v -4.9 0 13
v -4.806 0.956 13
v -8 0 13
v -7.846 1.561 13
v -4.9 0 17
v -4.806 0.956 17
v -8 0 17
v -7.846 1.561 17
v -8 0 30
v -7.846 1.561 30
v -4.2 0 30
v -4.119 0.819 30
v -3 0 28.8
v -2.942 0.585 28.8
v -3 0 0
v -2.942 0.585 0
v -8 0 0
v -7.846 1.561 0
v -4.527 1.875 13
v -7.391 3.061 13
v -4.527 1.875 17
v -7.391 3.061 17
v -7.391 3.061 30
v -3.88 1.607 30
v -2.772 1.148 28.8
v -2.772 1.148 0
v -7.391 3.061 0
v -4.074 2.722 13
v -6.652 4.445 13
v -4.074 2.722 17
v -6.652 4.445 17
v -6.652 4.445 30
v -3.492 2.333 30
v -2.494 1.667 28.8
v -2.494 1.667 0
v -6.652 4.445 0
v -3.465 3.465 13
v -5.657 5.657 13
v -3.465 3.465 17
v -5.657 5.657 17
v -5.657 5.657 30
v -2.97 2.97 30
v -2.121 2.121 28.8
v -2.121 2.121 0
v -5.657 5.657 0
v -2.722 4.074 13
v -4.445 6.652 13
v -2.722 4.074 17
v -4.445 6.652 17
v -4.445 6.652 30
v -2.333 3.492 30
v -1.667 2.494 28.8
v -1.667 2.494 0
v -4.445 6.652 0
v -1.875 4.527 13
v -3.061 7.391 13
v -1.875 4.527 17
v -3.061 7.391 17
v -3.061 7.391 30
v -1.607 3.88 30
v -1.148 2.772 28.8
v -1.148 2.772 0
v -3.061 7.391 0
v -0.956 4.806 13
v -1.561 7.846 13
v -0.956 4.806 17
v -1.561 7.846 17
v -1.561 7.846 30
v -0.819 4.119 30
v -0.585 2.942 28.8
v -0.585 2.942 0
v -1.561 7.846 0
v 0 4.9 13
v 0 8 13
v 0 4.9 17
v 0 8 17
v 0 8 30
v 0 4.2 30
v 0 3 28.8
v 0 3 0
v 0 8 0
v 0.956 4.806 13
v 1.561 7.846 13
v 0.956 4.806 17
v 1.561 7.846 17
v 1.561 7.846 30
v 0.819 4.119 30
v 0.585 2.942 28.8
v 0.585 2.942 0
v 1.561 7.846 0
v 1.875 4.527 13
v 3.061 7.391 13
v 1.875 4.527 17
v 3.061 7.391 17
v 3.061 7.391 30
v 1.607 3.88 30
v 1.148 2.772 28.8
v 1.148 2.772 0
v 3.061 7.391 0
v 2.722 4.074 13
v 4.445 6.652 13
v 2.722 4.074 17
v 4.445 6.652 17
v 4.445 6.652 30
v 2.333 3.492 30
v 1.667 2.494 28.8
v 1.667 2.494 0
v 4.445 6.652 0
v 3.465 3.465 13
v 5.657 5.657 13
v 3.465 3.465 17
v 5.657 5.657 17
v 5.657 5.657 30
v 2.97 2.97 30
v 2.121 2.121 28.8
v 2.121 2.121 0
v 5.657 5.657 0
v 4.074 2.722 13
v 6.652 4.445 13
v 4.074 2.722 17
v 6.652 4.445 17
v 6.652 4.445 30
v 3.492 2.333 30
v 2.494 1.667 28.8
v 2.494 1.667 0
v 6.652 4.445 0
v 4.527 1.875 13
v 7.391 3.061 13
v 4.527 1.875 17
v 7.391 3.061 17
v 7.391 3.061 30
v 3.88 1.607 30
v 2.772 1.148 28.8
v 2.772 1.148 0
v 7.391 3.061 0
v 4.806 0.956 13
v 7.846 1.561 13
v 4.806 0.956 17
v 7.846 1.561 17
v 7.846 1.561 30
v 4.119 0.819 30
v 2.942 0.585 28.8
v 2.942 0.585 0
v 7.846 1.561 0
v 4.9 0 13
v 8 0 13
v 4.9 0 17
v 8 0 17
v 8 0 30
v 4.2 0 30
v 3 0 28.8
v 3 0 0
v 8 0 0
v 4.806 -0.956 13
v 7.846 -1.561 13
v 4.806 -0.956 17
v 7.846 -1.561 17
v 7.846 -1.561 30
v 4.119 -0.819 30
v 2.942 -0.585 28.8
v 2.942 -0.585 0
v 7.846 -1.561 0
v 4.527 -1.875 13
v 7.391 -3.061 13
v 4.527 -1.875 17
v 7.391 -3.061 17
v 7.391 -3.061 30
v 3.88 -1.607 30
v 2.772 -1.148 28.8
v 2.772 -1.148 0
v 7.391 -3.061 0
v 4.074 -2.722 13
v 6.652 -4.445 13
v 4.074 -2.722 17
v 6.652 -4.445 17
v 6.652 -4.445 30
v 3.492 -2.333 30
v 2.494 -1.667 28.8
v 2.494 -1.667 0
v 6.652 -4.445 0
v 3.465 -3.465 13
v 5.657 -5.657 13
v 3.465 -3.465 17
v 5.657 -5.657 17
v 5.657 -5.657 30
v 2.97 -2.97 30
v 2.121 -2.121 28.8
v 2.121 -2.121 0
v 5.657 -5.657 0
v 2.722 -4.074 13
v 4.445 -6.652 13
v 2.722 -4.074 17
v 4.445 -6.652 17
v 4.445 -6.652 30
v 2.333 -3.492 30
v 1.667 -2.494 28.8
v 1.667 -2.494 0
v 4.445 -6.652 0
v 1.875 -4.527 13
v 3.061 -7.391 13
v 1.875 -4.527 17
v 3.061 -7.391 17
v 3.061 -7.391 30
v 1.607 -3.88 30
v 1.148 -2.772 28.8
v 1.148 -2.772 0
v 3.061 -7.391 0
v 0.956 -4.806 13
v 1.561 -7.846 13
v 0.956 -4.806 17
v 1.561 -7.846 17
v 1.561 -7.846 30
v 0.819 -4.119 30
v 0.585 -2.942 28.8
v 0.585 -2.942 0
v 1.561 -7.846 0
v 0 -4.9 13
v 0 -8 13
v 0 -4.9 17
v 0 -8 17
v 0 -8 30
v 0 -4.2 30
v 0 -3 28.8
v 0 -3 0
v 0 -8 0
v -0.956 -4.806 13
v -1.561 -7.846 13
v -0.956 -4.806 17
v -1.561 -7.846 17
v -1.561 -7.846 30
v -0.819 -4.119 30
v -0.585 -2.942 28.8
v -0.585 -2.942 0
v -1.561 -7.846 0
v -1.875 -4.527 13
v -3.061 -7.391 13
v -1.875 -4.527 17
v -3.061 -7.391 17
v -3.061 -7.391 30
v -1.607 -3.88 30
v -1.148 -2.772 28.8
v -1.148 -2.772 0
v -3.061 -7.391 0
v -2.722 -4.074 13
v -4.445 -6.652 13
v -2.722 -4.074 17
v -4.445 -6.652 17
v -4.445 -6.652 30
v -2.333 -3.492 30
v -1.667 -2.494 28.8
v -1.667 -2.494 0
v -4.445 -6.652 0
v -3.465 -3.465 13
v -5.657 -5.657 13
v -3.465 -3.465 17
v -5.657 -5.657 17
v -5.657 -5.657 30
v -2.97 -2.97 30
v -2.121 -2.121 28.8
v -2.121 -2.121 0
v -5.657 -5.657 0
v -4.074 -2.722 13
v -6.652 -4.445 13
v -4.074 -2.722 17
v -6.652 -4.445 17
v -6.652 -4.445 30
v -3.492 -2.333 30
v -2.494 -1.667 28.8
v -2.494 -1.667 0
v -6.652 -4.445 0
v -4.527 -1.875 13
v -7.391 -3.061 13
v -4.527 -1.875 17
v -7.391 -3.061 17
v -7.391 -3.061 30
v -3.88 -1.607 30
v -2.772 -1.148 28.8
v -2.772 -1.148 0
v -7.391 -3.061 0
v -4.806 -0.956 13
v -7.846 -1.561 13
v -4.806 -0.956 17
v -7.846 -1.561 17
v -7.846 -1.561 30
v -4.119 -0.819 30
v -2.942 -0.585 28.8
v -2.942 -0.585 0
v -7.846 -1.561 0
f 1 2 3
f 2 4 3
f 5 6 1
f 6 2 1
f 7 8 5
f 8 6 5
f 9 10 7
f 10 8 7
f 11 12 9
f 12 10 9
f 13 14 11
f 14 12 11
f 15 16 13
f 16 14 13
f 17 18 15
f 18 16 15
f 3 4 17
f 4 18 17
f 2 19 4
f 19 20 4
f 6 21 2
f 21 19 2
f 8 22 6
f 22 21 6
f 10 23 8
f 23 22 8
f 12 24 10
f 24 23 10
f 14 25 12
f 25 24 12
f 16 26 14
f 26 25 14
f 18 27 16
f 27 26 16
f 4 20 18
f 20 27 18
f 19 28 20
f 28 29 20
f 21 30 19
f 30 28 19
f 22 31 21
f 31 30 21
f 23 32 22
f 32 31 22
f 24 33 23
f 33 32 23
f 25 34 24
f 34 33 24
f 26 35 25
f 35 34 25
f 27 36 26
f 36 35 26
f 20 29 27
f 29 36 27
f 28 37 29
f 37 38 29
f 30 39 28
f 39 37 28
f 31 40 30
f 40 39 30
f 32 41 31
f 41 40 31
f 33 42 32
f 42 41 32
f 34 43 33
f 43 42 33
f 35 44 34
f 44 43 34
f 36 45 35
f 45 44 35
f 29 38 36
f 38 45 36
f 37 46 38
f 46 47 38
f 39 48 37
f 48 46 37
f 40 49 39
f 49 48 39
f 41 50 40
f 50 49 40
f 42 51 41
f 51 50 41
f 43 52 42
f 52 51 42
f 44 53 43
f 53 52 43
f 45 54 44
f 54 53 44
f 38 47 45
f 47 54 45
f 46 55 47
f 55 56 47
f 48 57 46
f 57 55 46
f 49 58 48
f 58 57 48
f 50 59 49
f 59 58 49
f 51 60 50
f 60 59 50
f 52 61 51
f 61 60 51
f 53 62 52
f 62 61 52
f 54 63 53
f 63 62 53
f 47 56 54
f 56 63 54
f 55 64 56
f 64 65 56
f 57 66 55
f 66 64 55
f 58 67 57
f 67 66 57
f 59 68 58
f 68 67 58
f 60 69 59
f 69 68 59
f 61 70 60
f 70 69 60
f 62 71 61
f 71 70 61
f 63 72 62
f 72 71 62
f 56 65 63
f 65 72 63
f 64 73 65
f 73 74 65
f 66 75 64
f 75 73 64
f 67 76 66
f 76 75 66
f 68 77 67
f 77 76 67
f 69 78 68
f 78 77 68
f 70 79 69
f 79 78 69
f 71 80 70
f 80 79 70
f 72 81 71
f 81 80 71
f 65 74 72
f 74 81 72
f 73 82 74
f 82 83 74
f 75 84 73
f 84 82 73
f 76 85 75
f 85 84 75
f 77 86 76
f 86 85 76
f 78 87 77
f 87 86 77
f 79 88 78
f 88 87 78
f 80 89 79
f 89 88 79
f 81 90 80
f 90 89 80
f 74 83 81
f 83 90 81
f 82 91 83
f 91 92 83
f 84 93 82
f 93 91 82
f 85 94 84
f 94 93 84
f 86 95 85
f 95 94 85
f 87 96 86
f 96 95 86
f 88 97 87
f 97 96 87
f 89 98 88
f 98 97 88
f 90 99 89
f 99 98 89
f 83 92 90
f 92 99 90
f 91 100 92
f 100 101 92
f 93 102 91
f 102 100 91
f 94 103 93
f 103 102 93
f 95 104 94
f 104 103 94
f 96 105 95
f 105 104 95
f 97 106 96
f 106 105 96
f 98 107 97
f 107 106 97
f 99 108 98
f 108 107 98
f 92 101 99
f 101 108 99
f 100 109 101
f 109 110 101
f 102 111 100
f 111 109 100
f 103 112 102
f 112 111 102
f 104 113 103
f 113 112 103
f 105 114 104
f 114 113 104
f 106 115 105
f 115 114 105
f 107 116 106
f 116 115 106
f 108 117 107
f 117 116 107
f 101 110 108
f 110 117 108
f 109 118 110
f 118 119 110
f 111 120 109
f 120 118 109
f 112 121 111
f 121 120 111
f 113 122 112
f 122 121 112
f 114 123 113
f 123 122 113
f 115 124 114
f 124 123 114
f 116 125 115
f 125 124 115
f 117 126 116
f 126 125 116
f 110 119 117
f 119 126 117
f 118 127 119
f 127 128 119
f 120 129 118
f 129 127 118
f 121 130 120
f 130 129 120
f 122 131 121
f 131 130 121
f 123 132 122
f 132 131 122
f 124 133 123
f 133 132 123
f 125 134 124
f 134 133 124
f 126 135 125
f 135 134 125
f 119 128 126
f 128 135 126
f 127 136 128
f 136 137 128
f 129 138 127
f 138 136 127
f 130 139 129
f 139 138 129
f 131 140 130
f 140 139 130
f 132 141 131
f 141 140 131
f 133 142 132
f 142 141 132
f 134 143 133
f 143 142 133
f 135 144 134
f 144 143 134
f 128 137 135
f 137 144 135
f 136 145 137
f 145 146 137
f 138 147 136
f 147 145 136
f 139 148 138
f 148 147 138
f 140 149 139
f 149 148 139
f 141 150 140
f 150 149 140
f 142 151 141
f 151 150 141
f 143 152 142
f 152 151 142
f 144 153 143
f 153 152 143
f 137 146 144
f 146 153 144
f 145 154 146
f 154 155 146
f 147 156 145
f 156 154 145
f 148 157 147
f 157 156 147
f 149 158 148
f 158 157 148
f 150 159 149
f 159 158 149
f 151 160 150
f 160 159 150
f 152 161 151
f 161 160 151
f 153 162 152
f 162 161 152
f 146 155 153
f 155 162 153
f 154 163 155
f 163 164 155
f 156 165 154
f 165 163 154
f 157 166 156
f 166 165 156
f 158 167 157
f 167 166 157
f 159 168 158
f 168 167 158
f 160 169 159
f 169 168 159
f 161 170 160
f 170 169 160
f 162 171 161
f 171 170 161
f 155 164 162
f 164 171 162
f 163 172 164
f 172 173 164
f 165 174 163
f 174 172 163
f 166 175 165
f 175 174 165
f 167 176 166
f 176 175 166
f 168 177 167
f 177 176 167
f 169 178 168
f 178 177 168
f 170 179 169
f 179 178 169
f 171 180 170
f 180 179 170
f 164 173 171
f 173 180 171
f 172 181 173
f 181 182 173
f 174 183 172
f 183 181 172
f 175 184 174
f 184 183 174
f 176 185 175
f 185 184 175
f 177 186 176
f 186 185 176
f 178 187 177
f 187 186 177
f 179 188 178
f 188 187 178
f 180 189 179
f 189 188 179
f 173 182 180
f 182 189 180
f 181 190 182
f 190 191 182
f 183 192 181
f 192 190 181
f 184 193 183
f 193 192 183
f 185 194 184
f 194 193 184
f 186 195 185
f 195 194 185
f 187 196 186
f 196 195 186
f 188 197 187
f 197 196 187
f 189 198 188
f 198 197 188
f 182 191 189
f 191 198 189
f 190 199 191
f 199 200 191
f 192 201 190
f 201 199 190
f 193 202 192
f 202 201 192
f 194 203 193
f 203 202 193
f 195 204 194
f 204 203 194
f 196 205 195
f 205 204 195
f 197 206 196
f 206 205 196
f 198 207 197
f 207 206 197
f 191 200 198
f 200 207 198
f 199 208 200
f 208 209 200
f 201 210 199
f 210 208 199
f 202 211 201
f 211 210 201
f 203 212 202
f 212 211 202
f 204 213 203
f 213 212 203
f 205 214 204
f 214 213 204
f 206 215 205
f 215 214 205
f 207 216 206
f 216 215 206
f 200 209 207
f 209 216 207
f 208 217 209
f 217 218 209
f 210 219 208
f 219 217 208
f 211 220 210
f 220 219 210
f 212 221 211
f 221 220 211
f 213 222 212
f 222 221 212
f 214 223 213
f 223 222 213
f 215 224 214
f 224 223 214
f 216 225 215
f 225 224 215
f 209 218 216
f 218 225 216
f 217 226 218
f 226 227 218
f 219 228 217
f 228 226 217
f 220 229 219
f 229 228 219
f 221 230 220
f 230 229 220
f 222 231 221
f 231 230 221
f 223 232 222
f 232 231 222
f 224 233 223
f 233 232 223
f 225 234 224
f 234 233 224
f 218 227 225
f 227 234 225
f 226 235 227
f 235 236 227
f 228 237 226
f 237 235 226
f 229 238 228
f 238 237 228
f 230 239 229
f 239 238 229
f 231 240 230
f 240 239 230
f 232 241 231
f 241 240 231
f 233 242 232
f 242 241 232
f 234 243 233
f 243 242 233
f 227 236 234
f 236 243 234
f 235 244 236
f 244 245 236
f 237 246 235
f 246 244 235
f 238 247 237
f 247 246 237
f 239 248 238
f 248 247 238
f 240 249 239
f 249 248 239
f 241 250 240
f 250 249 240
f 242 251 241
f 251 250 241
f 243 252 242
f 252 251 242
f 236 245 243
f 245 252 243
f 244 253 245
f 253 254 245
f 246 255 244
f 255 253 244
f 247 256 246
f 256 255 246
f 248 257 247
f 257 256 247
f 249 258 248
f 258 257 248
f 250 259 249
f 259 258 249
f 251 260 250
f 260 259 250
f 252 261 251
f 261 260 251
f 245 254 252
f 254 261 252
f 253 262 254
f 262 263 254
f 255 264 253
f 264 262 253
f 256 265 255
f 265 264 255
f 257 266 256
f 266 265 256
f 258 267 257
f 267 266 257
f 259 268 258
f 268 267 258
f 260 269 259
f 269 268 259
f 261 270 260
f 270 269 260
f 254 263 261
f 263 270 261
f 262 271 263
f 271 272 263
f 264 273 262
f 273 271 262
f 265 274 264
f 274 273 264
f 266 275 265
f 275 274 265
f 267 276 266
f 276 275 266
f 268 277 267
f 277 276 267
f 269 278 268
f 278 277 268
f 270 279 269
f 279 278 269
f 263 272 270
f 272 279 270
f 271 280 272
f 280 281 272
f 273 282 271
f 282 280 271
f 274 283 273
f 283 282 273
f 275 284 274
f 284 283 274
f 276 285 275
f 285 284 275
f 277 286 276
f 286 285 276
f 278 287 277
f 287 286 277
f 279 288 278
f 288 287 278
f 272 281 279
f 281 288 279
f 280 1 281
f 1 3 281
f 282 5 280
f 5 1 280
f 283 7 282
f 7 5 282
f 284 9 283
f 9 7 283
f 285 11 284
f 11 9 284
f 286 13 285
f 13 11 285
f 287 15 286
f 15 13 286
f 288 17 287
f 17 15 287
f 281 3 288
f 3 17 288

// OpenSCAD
$fn = 32;

// ----------------------------------------------------------------------
// Grooved revolve: thread_relief, bore R3
// ----------------------------------------------------------------------

// --- parameters (mm) ---
bore_r = 3;               // bore radius
outer_r = 8;              // outer radius of the body
total_h = 30;             // overall height, Z
wall = 5;                 // radial wall thickness
groove_w = 4;             // groove width
groove_d = 3.1;           // groove depth
grooves = 1;              // number of outer grooves
relief = 1.2;             // thread relief leg at the bore mouth
relief_angle = 45;        // thread relief chamfer angle, degrees
fit_tol = 0.1;            // declared fit tolerance (prompt contract)
free_tol = 0.3;           // declared free tolerance (prompt contract)

bbox_x = 2 * outer_r;  // full diameter
bore_d = 2 * bore_r;  // bore diameter
body_d = 2 * outer_r;  // body diameter
revolve_angle = 360;  // full turn around the Z axis

profile = [[3, 0], [8, 0], [8, 13], [4.9, 13], [4.9, 17], [8, 17], [8, 30], [4.2, 30], [3, 28.8]];  // primary outline, 9 points, counter clockwise

// --- the one profile operation ---
rotate_extrude(angle = revolve_angle) polygon(points = profile);
